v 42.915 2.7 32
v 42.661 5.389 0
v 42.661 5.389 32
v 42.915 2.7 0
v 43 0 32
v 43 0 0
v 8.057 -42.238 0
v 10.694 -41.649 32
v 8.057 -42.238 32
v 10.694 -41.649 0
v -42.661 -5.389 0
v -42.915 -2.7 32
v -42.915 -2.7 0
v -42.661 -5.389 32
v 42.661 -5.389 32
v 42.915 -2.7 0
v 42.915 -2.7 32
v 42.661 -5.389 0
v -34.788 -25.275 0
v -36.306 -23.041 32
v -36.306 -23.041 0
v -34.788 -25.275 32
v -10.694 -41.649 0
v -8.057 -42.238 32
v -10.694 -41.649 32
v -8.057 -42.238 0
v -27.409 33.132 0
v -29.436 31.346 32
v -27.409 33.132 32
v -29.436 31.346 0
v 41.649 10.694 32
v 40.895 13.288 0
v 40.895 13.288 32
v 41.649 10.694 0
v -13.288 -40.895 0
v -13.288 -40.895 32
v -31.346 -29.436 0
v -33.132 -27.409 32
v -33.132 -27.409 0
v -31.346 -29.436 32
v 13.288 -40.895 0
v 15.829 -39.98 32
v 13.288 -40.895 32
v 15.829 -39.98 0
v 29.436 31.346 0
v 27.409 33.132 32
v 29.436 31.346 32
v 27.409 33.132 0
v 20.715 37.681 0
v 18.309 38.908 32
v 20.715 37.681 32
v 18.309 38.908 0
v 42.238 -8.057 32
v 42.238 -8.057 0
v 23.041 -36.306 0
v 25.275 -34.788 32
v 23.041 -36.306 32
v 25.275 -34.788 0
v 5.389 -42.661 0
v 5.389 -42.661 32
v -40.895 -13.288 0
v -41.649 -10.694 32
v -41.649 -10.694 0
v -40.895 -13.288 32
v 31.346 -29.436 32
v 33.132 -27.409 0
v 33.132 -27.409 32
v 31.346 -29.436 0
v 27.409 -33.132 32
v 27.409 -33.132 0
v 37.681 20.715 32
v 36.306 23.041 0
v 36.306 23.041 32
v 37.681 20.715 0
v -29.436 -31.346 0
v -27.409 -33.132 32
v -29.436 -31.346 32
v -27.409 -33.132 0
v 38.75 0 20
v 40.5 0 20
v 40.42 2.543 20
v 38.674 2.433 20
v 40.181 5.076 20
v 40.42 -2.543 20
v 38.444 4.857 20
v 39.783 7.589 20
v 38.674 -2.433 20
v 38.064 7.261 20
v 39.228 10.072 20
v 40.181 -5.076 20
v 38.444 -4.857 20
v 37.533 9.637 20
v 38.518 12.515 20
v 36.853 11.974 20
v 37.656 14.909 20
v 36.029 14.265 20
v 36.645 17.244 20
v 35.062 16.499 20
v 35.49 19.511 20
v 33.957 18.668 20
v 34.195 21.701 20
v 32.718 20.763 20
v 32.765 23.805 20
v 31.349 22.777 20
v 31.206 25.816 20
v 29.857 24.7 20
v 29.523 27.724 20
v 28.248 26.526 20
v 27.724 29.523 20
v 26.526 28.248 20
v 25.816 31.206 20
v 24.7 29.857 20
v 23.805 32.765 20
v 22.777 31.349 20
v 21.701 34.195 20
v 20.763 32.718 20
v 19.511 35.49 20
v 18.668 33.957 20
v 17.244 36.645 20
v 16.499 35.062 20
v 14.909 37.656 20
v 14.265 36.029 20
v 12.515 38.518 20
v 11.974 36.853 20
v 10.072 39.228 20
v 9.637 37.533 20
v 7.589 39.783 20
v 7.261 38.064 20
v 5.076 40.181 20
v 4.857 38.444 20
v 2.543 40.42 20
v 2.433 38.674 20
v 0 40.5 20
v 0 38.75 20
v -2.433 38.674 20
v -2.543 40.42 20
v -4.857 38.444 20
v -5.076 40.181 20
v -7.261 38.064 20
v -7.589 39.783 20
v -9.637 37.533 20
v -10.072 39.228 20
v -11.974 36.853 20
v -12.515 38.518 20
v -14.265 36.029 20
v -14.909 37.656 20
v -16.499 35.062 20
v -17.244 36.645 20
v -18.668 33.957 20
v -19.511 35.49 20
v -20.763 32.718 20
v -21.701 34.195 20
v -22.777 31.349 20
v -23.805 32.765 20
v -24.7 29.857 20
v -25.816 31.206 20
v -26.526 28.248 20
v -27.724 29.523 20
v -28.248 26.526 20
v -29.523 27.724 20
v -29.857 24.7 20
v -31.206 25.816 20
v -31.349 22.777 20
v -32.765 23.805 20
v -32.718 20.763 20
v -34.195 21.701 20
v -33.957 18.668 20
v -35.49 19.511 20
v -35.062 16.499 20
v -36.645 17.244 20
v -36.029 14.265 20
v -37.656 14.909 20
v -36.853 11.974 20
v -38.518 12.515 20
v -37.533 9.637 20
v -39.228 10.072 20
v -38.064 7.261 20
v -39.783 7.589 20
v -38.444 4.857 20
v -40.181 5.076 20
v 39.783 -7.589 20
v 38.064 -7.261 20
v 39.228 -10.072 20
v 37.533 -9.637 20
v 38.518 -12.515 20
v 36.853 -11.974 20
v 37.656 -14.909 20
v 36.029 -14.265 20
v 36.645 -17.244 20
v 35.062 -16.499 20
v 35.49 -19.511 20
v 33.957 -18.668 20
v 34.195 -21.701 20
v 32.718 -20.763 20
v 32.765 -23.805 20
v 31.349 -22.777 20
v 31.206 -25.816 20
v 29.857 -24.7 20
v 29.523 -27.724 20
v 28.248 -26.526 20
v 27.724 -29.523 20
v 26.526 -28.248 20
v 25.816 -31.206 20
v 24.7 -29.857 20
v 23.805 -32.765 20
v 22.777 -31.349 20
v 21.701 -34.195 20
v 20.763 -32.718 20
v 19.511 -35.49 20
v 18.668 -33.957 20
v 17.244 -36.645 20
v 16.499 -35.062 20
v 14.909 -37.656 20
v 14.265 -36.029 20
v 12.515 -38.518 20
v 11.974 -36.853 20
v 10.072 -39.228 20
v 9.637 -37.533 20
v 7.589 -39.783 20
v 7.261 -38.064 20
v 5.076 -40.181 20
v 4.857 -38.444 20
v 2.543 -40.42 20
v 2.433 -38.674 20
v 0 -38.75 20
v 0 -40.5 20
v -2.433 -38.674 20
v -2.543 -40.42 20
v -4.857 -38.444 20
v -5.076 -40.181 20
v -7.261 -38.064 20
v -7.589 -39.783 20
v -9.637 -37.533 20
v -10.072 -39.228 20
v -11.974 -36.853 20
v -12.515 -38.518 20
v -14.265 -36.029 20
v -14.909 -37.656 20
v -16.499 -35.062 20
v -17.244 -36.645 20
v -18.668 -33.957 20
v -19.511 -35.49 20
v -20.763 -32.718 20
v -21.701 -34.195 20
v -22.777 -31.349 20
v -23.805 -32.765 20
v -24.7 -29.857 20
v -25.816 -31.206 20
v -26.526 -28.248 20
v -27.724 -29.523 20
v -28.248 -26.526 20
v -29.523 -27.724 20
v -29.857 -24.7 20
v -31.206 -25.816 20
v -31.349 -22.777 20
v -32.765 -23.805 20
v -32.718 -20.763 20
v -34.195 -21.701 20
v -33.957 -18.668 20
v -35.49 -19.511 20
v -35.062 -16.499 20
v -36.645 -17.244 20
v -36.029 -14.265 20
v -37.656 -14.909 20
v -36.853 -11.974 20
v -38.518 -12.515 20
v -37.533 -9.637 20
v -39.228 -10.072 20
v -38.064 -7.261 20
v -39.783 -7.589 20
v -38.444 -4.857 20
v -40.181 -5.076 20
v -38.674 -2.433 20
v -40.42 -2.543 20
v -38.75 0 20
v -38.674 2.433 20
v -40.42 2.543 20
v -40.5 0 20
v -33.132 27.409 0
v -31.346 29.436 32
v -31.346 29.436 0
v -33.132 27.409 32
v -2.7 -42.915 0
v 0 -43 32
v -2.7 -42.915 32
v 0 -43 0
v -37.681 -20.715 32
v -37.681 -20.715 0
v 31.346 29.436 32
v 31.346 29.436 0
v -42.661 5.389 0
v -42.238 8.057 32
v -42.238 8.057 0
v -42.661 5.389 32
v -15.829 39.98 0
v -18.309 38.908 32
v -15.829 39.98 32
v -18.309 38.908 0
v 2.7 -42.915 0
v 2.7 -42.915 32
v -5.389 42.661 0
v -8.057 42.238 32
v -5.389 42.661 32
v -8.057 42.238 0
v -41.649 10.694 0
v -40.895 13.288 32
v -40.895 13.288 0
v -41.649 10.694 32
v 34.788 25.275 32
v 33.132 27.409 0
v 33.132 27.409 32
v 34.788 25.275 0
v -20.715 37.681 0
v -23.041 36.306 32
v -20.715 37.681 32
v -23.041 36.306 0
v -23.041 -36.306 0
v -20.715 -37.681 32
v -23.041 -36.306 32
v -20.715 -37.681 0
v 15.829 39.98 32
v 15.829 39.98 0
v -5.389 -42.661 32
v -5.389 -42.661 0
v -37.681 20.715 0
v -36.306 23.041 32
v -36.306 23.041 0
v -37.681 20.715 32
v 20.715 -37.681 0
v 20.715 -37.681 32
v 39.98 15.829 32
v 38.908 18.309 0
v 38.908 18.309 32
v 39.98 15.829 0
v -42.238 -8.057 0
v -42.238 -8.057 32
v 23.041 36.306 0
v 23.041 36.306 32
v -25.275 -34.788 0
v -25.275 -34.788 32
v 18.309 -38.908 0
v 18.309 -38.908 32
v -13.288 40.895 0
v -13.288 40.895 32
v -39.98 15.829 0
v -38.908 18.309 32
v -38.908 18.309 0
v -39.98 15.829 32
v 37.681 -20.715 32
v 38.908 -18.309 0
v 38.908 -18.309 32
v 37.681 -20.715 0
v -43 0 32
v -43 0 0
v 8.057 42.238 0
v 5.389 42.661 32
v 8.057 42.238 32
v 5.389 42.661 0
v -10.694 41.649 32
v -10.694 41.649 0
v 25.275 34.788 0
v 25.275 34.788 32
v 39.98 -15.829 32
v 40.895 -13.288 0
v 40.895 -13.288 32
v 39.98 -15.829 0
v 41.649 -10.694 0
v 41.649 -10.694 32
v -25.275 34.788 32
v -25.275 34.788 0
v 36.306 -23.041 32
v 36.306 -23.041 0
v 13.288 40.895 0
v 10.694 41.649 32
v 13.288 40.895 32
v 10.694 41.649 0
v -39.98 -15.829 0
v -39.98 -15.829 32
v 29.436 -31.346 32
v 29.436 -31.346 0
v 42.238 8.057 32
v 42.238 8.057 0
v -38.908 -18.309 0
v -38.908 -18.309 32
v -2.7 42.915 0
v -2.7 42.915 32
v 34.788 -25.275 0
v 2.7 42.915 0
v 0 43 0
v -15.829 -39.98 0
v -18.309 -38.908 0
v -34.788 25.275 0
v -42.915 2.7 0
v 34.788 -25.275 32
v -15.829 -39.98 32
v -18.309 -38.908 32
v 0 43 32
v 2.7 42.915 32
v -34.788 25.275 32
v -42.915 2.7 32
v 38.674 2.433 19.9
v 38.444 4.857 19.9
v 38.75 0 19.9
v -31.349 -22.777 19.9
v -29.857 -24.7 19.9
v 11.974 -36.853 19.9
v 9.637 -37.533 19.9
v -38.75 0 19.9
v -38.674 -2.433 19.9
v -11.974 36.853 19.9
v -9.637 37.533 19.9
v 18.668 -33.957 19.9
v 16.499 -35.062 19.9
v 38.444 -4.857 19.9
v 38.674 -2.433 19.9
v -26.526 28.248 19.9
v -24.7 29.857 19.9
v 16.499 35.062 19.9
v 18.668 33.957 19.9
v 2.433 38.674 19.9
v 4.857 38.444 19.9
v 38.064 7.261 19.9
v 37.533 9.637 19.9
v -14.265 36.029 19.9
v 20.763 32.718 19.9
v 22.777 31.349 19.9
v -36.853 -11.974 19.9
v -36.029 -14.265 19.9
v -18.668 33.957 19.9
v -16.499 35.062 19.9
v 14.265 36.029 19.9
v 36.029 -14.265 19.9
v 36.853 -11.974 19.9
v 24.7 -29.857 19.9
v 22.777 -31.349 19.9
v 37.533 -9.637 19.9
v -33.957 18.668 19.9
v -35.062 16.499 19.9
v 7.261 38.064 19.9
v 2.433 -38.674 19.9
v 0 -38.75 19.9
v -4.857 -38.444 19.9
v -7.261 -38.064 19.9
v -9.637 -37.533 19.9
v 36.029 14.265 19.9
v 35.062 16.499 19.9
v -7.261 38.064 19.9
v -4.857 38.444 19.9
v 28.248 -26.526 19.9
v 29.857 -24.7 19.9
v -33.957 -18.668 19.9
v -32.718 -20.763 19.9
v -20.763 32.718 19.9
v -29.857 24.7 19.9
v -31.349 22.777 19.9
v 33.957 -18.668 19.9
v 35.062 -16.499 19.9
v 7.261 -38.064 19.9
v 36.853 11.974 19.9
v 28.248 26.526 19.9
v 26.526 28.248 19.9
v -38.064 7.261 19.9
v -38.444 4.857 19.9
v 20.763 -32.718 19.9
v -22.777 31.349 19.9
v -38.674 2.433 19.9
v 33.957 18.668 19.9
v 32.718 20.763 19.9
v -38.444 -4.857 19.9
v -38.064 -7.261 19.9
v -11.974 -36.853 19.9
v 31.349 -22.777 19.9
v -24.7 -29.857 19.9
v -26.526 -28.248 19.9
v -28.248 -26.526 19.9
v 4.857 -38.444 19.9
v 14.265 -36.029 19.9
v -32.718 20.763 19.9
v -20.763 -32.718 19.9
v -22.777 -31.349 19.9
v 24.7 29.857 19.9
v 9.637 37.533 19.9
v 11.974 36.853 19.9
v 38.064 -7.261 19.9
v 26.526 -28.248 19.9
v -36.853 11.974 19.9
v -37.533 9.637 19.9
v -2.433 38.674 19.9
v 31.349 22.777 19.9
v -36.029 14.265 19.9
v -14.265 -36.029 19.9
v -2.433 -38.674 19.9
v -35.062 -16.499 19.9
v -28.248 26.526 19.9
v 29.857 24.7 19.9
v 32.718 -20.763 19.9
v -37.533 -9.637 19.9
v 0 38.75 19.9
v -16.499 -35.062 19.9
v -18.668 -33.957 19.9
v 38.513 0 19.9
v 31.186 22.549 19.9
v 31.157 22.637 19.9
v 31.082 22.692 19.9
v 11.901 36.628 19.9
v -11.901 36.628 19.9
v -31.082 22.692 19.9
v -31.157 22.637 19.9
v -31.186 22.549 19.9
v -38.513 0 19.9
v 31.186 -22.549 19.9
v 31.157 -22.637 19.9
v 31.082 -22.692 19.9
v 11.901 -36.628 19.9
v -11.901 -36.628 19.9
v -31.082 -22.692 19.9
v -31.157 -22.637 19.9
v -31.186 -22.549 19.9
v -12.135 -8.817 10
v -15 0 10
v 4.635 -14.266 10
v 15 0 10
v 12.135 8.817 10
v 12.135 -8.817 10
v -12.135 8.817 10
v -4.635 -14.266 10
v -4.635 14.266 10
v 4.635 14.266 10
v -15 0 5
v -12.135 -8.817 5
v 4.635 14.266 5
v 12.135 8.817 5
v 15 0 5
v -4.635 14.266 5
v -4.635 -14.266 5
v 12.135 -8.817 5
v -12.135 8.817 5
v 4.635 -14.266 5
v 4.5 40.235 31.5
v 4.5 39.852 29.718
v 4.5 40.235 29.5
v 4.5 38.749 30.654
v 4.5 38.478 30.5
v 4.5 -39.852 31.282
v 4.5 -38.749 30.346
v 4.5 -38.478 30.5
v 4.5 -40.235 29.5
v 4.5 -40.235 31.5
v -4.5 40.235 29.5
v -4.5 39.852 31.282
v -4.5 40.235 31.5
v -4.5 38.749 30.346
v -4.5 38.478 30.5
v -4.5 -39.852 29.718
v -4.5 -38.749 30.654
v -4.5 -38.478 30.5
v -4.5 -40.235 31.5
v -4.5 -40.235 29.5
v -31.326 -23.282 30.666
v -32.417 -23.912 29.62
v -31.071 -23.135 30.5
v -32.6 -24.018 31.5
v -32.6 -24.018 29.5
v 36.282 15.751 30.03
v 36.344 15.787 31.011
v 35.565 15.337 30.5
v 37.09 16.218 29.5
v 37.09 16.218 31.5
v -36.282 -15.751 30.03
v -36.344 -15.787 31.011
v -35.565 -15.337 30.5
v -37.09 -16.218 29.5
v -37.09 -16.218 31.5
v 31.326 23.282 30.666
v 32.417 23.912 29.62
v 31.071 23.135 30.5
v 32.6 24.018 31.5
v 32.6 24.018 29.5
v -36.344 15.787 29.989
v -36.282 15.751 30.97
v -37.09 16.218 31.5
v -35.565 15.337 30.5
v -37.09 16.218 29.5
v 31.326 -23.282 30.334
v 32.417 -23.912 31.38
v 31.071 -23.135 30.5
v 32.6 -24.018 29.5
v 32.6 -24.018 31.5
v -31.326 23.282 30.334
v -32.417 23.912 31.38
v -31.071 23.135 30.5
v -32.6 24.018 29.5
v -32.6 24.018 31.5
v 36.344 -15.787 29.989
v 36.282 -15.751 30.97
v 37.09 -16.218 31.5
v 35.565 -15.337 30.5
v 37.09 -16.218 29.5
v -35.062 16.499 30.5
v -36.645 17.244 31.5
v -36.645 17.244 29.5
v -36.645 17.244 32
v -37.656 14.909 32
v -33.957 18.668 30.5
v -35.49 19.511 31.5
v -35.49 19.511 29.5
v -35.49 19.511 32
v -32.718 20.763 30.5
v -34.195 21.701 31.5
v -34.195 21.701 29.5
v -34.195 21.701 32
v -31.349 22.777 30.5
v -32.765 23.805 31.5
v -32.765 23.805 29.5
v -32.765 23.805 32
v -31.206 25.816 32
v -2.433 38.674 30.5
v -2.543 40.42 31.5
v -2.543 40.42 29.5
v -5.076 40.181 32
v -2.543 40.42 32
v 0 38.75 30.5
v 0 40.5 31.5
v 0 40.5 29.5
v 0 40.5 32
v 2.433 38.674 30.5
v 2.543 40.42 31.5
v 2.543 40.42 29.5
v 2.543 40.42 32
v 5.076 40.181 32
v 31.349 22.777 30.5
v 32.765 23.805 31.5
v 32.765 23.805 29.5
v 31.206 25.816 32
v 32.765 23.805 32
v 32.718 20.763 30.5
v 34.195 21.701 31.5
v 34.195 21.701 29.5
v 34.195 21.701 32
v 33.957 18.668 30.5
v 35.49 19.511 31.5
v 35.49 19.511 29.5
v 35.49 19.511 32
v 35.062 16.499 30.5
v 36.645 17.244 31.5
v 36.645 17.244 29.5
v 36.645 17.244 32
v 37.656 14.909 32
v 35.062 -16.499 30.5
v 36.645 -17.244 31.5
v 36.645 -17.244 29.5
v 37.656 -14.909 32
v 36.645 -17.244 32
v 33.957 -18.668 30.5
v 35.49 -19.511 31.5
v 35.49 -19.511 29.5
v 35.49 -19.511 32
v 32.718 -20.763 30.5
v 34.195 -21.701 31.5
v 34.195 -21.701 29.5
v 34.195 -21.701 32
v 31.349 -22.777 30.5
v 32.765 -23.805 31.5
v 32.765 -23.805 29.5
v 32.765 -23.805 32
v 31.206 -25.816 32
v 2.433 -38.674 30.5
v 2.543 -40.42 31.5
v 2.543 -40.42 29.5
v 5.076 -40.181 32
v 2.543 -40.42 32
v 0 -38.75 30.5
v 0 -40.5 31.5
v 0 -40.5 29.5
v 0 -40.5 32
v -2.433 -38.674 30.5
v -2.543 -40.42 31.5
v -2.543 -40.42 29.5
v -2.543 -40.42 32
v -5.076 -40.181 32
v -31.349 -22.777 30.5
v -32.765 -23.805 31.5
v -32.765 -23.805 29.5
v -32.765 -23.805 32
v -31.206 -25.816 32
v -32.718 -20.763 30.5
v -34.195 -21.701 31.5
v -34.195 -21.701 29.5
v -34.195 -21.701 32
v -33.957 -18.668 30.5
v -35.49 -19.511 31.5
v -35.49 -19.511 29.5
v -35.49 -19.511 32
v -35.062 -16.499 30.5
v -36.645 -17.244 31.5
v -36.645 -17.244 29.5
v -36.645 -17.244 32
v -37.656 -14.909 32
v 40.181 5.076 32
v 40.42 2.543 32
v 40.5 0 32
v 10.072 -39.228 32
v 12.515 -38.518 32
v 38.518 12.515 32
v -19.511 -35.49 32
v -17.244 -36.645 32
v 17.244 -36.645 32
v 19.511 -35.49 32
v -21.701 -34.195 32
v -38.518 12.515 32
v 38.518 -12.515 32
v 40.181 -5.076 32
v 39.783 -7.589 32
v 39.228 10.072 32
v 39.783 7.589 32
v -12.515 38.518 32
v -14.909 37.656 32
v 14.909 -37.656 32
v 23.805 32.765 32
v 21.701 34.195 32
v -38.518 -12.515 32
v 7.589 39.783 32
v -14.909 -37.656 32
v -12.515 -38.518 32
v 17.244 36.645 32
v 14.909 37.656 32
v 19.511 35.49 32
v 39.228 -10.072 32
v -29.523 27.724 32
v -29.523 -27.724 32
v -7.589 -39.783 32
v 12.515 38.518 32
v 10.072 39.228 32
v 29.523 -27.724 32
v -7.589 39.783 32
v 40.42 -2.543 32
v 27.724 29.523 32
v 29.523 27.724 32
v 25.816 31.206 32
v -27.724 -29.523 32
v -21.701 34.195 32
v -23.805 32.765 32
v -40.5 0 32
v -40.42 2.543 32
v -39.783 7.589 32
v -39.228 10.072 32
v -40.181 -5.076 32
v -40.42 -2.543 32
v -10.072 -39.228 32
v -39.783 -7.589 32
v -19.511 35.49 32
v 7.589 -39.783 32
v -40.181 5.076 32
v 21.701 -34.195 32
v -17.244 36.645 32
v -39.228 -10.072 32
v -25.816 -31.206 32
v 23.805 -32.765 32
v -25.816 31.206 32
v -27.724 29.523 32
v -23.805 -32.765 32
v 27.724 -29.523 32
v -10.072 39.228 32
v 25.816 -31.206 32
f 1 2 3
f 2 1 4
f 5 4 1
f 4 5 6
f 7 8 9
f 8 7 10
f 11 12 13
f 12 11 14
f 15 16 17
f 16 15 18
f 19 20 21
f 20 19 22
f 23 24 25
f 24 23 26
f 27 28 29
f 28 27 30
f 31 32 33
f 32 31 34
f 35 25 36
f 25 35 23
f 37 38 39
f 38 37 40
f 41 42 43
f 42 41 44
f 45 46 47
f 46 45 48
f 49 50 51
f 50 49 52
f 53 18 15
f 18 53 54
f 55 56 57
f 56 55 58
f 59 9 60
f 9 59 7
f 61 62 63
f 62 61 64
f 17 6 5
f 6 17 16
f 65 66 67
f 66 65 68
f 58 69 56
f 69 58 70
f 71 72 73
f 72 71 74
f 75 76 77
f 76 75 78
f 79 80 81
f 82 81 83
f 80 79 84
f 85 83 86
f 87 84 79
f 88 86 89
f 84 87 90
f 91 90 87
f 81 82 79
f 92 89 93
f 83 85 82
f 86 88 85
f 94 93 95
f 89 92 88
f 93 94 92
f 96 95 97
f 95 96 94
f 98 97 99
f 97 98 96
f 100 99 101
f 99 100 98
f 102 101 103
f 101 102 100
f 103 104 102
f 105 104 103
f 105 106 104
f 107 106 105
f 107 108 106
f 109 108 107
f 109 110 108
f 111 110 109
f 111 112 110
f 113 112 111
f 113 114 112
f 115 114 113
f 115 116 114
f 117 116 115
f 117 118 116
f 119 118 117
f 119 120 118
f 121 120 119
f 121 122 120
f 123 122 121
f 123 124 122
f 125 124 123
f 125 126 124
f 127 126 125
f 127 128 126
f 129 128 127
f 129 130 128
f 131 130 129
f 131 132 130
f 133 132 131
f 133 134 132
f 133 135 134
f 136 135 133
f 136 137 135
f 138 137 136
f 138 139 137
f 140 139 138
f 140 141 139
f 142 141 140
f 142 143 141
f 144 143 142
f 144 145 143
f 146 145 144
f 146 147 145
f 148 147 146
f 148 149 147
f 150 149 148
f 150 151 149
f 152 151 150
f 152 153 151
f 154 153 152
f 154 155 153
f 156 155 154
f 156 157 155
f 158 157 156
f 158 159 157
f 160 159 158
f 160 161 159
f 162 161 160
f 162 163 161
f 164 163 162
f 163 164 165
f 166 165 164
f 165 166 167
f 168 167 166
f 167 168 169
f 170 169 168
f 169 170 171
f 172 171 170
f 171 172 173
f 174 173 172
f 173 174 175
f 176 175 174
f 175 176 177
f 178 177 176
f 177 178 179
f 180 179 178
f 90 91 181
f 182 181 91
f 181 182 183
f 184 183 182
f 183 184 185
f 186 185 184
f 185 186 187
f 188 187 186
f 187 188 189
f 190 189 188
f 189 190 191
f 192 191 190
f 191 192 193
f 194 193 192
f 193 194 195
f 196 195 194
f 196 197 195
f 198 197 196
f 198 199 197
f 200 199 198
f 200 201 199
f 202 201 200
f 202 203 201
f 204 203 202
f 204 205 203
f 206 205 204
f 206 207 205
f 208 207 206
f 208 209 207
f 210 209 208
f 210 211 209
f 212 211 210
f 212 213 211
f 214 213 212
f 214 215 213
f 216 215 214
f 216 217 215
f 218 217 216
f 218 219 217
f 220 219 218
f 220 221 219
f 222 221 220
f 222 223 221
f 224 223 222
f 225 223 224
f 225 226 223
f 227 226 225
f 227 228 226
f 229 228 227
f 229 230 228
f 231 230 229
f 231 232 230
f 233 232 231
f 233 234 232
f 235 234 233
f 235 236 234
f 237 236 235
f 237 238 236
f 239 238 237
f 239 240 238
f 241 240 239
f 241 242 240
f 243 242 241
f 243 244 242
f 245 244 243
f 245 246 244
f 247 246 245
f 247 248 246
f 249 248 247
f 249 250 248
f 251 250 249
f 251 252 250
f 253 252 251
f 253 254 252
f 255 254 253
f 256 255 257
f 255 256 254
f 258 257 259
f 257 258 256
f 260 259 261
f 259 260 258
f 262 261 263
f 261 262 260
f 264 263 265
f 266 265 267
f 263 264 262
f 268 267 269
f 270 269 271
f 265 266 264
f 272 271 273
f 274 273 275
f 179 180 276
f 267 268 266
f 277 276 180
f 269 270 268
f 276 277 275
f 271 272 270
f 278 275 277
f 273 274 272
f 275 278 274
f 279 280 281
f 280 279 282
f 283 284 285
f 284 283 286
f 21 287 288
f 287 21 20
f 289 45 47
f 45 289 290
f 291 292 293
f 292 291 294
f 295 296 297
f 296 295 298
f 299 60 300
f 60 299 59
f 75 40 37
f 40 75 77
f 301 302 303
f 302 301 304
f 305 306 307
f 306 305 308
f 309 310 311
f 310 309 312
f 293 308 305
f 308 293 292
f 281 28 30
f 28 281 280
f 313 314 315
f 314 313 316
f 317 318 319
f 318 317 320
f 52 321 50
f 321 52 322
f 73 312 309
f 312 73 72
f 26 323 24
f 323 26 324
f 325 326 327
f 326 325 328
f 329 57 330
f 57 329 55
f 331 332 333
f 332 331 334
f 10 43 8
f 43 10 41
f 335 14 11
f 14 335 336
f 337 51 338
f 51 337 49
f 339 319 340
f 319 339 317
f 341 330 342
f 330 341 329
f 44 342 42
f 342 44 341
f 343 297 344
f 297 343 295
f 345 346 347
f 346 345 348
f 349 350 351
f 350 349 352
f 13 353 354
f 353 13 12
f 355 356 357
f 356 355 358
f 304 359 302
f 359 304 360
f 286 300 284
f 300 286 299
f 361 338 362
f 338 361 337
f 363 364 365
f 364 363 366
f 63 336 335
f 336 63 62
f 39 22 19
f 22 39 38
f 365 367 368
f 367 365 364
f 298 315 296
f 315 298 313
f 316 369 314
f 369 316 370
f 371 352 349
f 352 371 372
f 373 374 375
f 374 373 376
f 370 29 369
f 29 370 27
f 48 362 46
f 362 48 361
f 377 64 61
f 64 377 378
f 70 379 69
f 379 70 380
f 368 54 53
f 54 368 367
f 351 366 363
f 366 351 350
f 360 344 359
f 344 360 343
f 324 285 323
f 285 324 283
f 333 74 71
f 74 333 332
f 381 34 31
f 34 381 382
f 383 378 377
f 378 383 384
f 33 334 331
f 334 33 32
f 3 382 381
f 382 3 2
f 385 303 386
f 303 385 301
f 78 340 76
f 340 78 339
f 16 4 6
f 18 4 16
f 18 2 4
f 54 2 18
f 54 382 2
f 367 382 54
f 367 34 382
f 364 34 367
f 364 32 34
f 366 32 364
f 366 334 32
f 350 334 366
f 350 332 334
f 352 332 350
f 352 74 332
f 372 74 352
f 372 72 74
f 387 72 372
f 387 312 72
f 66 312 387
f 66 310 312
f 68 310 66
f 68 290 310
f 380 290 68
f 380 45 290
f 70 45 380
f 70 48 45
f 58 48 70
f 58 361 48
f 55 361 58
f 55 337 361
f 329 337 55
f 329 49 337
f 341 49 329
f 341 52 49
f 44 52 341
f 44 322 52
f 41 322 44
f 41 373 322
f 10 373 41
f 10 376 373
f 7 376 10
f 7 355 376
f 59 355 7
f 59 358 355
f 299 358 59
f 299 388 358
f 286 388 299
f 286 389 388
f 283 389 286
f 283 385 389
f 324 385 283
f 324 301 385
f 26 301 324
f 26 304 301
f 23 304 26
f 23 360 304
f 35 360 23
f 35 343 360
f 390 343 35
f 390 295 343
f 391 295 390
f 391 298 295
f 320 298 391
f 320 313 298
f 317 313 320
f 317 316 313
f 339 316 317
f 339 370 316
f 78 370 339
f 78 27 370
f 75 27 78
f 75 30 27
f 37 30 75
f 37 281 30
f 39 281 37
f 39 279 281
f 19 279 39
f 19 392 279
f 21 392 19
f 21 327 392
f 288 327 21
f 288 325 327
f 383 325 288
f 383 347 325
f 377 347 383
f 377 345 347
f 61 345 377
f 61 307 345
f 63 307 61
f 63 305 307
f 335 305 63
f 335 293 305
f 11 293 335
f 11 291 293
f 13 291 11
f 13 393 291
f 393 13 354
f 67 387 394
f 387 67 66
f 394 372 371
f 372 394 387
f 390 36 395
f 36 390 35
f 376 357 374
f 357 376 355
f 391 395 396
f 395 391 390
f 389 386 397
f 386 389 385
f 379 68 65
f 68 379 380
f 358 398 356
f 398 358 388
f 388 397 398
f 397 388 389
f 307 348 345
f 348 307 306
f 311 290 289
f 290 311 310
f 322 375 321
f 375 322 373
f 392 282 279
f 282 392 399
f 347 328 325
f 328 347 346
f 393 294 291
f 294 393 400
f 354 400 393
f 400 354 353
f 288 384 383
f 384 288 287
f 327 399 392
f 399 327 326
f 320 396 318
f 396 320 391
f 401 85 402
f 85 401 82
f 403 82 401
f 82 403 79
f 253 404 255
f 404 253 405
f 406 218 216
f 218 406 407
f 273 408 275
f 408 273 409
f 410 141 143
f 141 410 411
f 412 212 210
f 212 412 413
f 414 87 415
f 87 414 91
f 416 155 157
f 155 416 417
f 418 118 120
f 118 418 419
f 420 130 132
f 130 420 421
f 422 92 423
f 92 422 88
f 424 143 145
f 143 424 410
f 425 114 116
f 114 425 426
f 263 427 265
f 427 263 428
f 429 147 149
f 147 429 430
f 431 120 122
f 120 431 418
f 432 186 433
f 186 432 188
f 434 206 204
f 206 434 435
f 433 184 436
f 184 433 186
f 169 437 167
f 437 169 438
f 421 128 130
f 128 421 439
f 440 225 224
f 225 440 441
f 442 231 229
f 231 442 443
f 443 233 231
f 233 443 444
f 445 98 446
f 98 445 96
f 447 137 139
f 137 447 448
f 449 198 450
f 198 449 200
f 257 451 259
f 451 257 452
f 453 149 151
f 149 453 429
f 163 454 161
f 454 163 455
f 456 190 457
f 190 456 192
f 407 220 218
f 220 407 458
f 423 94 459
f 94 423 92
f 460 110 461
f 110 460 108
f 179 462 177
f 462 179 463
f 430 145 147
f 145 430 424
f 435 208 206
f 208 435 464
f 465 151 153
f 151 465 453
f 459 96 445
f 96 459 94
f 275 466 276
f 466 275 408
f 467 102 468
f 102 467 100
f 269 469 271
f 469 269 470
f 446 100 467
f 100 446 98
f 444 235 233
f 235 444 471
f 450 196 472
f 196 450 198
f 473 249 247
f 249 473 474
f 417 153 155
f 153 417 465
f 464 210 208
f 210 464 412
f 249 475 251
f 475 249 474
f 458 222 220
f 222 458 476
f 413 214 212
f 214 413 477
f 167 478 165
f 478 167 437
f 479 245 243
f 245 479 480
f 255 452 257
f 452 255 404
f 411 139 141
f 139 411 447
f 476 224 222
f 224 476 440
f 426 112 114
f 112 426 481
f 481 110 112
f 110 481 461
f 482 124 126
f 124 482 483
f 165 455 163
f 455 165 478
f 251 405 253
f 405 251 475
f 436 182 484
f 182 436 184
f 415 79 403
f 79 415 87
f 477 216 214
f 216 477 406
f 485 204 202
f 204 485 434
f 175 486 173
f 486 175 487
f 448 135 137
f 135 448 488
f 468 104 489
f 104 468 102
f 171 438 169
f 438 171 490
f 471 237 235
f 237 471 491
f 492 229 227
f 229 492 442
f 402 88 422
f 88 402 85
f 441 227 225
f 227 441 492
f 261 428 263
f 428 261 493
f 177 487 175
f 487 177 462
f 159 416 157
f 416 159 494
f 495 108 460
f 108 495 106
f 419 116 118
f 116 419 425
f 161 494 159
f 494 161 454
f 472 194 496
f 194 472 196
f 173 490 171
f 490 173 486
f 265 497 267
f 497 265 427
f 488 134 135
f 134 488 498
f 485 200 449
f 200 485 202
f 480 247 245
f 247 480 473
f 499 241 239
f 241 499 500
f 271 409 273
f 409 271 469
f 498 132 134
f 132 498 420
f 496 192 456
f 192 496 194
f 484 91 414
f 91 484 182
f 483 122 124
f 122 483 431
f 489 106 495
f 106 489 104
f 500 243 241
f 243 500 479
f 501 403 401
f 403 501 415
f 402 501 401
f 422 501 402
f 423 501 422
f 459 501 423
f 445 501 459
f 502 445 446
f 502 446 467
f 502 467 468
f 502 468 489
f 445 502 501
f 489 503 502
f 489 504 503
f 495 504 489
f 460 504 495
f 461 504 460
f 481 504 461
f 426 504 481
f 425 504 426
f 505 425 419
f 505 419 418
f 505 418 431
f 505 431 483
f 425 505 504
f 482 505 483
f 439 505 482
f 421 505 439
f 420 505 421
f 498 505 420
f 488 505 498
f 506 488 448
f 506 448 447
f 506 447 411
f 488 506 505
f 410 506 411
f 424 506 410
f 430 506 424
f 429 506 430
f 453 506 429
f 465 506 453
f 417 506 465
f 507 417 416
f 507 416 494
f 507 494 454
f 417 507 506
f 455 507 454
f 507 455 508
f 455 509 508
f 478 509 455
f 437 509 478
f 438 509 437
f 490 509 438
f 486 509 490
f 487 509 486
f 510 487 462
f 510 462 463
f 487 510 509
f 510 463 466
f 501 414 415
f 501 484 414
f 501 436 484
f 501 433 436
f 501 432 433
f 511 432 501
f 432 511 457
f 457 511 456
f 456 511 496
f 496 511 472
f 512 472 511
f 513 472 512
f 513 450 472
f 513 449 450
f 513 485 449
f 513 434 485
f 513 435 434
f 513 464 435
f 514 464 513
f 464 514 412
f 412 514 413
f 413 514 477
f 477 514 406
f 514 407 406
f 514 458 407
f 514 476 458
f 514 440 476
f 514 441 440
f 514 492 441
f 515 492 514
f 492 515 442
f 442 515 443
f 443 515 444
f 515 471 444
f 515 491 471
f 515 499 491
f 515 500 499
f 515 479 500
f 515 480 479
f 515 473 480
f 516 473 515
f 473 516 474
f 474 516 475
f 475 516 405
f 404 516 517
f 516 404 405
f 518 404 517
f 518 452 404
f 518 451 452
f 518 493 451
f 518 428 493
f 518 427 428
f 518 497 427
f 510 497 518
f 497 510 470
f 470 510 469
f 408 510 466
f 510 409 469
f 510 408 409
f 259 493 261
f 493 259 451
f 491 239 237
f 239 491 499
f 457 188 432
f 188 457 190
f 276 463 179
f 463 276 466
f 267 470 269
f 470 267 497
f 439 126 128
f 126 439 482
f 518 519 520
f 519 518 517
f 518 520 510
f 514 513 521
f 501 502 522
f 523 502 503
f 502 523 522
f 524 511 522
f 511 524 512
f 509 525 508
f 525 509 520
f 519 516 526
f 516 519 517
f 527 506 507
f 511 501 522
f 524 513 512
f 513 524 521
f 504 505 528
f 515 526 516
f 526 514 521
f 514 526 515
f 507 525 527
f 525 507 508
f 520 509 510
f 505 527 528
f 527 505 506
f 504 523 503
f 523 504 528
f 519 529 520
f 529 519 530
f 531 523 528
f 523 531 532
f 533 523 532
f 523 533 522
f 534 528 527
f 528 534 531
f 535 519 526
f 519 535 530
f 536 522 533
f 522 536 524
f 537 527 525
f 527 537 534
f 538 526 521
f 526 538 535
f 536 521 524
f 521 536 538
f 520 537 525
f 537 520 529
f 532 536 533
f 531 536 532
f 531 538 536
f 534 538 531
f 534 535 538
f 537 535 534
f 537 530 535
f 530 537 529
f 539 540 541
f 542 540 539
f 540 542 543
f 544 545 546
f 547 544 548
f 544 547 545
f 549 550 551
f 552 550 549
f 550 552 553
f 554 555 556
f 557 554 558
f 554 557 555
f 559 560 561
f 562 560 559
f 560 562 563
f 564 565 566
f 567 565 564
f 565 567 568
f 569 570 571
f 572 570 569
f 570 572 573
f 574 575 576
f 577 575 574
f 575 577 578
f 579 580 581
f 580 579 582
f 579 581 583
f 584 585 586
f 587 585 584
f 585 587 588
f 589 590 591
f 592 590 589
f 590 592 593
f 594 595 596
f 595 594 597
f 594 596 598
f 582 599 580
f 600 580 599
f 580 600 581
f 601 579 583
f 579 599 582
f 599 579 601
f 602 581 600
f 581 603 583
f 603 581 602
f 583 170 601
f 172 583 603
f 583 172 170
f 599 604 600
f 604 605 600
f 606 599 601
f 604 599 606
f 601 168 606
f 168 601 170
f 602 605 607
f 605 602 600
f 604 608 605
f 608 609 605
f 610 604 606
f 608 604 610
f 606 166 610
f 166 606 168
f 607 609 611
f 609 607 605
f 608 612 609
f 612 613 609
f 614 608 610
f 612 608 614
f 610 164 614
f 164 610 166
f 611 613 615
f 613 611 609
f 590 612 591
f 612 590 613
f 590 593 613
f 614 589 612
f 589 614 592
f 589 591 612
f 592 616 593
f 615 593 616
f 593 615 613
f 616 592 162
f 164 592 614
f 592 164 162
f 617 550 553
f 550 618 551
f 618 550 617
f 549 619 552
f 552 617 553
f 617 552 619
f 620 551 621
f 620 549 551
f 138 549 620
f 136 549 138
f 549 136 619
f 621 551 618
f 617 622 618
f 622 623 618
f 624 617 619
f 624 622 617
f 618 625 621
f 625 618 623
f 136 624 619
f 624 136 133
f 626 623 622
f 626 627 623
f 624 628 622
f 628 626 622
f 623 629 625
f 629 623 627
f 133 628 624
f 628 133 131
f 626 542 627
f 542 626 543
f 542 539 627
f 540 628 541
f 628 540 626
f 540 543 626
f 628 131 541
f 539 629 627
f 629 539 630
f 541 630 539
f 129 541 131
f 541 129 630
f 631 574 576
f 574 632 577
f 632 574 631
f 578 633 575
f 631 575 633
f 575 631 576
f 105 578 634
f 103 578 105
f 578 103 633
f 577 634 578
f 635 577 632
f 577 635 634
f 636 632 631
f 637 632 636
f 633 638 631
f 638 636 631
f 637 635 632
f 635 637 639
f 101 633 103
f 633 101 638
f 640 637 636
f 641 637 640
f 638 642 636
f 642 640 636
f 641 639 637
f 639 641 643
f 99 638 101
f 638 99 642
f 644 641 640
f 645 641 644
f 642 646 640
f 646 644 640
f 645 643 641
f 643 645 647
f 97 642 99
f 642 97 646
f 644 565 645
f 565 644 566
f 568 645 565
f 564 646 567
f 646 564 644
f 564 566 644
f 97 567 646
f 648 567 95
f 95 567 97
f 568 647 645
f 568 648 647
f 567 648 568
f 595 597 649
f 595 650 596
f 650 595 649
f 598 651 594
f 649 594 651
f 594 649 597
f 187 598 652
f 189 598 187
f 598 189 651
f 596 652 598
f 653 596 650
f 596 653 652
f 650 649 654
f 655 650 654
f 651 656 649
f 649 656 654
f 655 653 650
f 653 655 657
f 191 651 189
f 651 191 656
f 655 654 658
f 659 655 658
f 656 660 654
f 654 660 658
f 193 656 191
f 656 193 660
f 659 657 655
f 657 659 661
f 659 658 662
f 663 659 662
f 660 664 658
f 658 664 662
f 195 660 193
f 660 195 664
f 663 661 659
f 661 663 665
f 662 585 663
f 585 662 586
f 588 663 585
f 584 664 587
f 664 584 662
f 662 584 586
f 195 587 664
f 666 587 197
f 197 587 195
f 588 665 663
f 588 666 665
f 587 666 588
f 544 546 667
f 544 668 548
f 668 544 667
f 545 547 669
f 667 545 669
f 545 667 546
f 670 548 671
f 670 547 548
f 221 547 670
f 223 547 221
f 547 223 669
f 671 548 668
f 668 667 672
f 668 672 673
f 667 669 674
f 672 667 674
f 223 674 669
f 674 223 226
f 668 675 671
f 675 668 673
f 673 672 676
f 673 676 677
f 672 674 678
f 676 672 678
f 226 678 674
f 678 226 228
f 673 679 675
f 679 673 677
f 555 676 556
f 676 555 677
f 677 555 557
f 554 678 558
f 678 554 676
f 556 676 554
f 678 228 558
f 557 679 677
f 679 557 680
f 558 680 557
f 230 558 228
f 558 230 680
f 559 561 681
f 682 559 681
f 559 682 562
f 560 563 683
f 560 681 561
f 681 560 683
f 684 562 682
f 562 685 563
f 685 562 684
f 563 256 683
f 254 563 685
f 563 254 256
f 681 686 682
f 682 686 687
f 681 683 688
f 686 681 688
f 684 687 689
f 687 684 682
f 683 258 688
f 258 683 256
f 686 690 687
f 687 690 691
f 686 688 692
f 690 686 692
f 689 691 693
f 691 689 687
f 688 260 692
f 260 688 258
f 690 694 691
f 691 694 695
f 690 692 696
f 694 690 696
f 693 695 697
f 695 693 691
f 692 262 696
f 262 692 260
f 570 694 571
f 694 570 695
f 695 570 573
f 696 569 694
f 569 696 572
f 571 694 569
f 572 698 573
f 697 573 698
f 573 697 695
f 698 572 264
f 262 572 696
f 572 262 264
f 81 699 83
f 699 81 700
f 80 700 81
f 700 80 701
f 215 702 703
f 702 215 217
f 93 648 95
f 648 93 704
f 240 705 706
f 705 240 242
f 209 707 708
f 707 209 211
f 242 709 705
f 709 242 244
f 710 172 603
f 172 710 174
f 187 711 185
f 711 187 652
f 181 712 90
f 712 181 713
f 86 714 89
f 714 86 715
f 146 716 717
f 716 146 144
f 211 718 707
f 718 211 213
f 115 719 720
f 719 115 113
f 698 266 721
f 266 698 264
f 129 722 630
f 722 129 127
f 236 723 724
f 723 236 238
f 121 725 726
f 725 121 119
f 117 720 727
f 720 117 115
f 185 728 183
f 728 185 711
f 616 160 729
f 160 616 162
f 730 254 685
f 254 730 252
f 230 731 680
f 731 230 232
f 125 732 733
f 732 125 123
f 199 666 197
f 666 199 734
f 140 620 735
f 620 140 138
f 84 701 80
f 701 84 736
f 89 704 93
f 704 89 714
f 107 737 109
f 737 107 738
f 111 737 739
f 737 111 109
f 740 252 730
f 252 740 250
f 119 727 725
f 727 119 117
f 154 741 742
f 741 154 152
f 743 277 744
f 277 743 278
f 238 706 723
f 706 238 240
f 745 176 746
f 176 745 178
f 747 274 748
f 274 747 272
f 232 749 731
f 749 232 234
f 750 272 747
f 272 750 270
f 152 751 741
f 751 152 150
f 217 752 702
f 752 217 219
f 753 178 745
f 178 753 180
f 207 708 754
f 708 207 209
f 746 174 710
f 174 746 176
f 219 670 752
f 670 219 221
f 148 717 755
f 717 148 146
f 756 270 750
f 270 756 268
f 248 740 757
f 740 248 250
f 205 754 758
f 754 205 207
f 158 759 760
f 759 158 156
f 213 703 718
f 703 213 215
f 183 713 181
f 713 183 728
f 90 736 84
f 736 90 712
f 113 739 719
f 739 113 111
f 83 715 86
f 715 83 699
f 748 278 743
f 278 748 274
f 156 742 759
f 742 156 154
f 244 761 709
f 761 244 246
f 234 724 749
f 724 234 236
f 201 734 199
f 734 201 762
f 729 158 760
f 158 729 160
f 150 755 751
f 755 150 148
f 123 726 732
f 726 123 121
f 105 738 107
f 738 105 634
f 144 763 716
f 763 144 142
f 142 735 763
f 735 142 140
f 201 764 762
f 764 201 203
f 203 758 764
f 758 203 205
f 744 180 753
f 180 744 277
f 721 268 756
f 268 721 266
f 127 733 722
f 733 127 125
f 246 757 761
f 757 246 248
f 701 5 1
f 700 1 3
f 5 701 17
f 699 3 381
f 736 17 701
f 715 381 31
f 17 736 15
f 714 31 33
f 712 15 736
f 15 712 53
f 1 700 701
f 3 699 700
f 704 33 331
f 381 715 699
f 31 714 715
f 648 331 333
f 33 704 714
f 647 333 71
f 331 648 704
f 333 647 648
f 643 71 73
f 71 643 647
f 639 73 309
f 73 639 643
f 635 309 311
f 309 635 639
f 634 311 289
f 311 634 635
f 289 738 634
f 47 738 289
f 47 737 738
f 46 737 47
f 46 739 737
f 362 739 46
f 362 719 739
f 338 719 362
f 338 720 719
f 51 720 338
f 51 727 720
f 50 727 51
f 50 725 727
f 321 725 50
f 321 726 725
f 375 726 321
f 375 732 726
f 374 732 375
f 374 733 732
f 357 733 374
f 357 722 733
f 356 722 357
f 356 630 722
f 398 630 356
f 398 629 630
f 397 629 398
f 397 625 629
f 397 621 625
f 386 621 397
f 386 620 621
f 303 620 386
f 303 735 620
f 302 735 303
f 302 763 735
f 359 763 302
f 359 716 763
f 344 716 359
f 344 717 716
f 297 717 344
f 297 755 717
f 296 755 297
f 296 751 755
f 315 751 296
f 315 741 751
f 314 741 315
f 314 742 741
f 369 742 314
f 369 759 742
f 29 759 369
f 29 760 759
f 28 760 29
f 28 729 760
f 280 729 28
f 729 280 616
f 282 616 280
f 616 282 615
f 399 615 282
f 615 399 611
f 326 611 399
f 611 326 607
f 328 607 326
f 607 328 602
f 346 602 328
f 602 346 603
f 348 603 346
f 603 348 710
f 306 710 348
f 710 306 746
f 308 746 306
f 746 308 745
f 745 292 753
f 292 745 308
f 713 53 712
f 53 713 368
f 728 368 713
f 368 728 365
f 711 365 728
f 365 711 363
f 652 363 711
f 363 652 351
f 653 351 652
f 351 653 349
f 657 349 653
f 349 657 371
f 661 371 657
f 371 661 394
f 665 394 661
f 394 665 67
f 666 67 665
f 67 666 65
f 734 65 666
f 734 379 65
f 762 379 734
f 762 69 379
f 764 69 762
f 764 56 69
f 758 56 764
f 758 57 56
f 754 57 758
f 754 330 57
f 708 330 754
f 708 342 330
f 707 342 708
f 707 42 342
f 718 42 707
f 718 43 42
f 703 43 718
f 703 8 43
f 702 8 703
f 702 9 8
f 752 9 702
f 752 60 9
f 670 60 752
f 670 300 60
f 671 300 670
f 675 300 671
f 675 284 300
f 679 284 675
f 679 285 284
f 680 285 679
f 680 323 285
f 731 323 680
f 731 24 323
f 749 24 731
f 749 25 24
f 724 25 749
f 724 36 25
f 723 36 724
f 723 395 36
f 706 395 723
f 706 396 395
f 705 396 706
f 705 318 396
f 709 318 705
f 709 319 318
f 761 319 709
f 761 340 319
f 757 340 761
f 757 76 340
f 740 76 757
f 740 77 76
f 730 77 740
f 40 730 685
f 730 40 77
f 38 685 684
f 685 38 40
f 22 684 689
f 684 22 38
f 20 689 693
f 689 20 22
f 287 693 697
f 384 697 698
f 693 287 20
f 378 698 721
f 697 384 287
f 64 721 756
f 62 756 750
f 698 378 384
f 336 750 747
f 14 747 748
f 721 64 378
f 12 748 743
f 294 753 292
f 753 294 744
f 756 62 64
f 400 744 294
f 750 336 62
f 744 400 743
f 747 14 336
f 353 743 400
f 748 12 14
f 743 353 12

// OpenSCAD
use <threads.scad>

potDiameter=77.5;
potOuterDiameter=81;
deDiameter=30;
capHeight=20;
objectOutsideDiameter=potOuterDiameter+5;
teethHeight=2;
teethWidth=9;
screnHeight=12;
$fn=100;

difference(){
    cylinder(capHeight, d=objectOutsideDiameter);
    translate([0,0,capHeight-0.1])
        cylinder(2, d=potDiameter);
    translate([0,0,10])
        cylinder(capHeight - 10, d1=deDiameter, d2=potDiameter, $fn=10);
    translate([0,0,5])
        cylinder(6, d=deDiameter, $fn=10);
}

translate([0,0,capHeight])
    difference(){
        cylinder(screnHeight, d=objectOutsideDiameter);
        translate([0,0,-0.5])
            difference(){
                cylinder(screnHeight+1, d=potOuterDiameter);
                translate([0,0,screnHeight-2])
                    intersection(){
                    rotate_extrude()
                        translate([potDiameter/2,0,0])
                            polygon([
                                [(potOuterDiameter - potDiameter)/2,0],
                                [0, teethHeight/2],
                                [(potOuterDiameter - potDiameter)/2, teethHeight],
                            ]);
                     for(i = [0:3]){
                        rotate([0, 0, i * (360/3)])
                        cube([teethWidth, potOuterDiameter+10, teethHeight+10], center=true);
                    }
                    }
            }
    }
